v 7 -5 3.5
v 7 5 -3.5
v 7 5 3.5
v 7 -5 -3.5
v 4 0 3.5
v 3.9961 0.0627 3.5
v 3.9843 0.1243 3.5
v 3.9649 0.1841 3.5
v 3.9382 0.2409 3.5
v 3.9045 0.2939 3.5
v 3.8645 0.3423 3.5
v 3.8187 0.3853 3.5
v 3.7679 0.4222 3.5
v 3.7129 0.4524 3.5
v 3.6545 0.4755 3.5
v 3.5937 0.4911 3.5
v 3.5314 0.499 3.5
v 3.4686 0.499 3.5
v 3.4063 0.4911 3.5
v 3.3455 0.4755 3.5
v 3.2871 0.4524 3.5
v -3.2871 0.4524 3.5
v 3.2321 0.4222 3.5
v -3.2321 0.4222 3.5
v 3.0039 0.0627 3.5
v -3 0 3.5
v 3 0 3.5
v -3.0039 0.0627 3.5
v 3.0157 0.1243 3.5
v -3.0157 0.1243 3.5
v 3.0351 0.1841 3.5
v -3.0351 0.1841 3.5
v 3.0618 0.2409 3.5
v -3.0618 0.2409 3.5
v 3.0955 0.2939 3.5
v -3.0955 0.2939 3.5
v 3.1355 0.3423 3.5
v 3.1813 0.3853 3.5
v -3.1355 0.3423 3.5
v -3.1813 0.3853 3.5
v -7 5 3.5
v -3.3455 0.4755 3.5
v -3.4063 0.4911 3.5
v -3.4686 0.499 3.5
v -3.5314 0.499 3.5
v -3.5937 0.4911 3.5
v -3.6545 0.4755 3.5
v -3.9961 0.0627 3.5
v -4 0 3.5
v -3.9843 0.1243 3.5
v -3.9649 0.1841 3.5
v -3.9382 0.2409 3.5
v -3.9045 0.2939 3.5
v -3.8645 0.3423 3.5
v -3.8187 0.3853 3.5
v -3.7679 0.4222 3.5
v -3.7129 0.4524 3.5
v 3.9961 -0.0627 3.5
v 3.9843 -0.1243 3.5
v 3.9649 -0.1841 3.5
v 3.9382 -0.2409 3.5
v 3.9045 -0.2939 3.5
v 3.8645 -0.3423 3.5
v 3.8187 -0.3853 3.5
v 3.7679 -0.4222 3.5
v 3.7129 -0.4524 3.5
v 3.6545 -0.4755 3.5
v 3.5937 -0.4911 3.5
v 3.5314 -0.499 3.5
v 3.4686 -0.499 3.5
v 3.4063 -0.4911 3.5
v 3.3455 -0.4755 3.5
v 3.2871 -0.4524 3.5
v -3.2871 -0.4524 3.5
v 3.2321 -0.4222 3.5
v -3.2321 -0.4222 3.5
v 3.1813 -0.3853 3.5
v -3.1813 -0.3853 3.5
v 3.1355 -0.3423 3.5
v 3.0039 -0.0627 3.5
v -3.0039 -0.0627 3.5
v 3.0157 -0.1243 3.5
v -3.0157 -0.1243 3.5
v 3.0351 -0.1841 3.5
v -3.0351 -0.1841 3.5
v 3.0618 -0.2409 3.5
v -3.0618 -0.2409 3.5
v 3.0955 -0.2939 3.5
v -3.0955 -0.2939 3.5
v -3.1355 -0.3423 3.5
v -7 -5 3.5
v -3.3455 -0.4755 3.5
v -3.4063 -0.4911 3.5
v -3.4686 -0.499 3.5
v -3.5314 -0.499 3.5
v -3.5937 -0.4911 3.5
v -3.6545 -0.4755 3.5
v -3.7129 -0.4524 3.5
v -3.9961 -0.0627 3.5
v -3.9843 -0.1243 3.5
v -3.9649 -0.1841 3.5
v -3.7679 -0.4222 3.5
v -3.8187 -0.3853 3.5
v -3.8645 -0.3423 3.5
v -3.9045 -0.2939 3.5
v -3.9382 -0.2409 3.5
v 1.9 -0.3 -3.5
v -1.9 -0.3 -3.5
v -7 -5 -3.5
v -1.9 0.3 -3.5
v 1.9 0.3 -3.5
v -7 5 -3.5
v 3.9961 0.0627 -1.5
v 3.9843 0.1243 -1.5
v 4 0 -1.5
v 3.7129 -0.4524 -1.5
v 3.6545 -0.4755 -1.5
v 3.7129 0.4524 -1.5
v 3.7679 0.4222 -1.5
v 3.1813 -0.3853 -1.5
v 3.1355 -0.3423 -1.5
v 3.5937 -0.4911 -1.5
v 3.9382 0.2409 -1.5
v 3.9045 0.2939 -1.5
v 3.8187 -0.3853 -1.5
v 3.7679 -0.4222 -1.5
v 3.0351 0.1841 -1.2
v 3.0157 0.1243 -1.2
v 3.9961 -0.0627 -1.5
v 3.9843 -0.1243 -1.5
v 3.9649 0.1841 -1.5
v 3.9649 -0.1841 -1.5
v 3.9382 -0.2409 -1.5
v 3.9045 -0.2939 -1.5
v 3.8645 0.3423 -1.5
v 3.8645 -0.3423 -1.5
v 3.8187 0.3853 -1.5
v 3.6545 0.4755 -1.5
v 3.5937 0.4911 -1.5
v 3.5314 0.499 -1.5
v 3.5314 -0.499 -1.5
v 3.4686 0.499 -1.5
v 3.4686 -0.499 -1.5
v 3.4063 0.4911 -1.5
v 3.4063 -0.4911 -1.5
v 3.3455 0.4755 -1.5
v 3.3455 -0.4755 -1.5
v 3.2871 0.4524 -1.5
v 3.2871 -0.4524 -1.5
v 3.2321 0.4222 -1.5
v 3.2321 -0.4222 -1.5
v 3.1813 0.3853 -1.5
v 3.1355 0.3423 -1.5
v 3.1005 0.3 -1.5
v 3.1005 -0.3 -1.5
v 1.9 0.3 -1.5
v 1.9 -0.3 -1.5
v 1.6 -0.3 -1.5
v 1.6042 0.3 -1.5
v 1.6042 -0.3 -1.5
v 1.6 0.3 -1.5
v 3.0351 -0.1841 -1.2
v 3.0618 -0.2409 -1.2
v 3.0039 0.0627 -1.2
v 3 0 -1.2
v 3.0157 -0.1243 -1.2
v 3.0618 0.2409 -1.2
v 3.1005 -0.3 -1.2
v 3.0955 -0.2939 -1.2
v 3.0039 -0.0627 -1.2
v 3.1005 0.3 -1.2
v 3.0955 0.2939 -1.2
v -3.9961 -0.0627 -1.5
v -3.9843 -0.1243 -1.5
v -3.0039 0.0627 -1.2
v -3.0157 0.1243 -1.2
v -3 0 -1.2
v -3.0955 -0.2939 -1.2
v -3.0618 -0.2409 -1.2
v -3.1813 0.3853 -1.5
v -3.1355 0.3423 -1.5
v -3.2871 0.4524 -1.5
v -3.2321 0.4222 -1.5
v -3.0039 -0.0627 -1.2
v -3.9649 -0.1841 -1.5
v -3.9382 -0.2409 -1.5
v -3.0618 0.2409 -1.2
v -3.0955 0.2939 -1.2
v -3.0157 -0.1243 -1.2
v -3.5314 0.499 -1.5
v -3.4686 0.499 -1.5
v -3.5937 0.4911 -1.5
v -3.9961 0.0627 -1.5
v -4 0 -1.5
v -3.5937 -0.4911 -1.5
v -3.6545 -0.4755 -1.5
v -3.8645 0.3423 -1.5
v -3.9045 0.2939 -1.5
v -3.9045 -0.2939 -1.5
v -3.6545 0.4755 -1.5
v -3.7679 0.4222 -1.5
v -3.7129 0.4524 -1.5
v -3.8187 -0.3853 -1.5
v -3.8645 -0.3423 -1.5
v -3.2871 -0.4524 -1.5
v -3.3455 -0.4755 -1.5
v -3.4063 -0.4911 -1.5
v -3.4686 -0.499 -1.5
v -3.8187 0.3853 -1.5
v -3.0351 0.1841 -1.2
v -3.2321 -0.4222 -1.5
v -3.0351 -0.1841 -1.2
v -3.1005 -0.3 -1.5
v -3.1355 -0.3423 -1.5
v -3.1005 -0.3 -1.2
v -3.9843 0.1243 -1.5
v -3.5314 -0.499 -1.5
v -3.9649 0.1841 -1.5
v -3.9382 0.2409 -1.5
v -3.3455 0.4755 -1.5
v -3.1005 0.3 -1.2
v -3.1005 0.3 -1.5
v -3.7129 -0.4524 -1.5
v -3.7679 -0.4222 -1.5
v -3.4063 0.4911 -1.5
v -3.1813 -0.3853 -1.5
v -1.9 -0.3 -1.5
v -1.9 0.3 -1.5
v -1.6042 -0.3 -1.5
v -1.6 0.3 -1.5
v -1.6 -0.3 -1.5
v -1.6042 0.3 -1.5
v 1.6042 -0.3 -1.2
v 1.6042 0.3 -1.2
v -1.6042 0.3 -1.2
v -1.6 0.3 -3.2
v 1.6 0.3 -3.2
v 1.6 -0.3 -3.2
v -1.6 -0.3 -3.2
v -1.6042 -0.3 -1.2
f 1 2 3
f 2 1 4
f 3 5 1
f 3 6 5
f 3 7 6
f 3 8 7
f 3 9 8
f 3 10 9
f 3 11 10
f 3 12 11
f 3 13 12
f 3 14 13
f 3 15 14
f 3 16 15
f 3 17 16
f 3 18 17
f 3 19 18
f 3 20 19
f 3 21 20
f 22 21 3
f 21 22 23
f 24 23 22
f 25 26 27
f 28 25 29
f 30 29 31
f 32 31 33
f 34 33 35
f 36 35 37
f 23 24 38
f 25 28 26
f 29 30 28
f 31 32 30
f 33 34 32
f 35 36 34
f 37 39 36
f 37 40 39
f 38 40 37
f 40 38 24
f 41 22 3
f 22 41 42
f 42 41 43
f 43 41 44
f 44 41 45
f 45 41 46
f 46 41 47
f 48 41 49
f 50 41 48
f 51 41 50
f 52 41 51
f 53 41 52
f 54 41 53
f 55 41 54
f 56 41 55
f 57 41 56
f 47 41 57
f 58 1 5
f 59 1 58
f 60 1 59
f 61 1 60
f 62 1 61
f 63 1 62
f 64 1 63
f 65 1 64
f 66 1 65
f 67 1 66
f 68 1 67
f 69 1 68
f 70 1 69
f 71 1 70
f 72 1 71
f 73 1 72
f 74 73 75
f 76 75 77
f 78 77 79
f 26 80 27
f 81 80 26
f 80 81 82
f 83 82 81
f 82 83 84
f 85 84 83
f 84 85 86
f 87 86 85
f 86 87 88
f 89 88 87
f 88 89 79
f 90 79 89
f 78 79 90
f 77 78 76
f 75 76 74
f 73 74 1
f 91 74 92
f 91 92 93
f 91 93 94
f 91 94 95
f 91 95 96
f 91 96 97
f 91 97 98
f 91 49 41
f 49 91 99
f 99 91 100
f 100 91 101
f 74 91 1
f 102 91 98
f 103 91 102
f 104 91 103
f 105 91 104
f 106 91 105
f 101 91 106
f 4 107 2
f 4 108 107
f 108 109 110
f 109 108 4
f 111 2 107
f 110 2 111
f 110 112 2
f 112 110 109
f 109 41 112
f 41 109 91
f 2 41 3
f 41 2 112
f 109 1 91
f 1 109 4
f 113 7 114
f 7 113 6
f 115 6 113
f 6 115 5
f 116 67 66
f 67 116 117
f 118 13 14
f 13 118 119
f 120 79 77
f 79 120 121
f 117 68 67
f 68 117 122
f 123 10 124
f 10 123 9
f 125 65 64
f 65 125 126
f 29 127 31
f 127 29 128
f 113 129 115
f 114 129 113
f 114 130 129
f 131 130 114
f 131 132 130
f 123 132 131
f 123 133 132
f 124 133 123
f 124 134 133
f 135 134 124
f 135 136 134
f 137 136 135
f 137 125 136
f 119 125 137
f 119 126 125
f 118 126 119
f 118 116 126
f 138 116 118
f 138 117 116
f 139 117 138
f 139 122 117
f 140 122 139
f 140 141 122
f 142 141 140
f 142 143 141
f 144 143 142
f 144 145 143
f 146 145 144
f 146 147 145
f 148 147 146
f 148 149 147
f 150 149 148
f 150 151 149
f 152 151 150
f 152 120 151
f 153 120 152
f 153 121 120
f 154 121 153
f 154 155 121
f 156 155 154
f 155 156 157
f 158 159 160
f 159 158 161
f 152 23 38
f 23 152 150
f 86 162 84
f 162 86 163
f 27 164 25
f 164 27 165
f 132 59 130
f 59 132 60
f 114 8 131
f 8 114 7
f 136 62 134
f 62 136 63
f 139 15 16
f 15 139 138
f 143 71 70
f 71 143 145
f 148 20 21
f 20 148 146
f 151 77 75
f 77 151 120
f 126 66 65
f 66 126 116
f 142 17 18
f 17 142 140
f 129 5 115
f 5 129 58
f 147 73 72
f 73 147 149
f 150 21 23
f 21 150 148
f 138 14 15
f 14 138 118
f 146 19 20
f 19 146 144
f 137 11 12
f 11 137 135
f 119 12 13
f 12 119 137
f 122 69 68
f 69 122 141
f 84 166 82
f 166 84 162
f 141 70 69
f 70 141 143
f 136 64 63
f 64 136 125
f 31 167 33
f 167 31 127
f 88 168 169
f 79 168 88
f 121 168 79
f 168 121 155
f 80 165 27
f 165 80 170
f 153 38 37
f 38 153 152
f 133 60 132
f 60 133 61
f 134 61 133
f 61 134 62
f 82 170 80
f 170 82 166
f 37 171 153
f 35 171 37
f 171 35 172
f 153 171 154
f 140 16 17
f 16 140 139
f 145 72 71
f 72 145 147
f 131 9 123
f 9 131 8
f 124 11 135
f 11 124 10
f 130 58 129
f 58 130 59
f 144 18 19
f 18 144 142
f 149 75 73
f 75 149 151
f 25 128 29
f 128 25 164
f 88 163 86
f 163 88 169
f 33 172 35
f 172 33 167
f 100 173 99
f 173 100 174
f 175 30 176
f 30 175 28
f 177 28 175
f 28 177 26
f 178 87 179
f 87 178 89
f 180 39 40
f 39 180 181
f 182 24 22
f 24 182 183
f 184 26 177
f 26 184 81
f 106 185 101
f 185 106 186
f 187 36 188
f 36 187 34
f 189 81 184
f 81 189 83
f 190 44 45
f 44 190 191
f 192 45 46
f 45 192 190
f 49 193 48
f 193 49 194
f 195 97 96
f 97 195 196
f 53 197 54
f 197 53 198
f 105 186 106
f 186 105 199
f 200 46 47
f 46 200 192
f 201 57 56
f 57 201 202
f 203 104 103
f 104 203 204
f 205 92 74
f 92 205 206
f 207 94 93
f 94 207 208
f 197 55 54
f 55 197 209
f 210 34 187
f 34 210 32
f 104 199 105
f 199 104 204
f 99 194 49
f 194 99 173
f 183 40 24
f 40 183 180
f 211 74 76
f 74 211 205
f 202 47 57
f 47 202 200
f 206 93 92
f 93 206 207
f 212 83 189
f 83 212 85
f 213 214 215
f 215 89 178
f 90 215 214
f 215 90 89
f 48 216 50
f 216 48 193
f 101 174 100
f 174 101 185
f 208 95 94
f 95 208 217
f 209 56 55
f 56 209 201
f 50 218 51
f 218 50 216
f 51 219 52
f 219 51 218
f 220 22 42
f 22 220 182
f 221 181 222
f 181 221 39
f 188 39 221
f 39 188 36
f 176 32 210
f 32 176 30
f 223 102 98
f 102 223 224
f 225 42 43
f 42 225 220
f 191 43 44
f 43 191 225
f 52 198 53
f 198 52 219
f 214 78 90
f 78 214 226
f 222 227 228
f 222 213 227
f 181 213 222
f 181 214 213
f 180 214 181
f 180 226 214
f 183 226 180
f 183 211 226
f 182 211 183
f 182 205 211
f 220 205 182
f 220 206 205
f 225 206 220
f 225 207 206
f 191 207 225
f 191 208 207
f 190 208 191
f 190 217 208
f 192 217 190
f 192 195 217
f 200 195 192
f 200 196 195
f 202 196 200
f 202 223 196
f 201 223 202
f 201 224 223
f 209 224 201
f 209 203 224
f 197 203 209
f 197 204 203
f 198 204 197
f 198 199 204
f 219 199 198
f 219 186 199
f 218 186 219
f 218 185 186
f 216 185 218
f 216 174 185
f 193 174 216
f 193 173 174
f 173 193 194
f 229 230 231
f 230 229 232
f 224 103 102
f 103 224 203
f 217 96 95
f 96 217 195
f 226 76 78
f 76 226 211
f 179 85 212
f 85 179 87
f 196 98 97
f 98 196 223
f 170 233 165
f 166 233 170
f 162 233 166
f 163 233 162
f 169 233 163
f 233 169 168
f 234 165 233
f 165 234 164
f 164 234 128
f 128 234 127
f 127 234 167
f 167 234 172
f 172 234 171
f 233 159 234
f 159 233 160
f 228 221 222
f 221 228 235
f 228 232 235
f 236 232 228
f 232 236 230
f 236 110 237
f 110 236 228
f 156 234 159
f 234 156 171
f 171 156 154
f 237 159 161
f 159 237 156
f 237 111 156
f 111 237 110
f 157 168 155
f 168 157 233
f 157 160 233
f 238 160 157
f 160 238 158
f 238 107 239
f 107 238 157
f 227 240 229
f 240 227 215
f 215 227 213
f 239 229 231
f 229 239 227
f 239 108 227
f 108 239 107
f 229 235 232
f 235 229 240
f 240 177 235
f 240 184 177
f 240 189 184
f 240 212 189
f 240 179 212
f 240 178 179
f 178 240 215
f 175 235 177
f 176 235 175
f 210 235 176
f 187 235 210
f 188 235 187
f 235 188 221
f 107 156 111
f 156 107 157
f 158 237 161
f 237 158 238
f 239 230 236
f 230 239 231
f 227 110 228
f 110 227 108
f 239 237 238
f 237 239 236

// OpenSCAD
module mrMicro(){
	//block dimensions (use for shifting)
	x=14;
	y=10;
	z=7;
	depth=5; 
	difference(){
		cube([x,y,z], center =true);
		//translate([-x/2,0,0])cube([x,y,z], center =true);
		translate([.25*x,0,1])cylinder(r=.5,h=depth,$fn=50,center=true);
		translate([-.25*x,0,1])cylinder(r=.5,h=depth,$fn=50,center=true);
		translate([x/4-(x/16),0,-1.5+.15])cube([x/8+x/48,.6,.3],center=true);
		translate([(x/4-x/16),0,-1.5+.15])cube([x/8+x/48,.6,.3],center=true);
		translate([-(x/4-x/16),0,-1.5+.15])cube([x/8+x/48,.6,.3],center=true);
		translate([x*.125,0,-2.5])cube([.3,.6,z-depth],center=true);
		translate([-x*.125,0,-2.5])cube([.3,.6,z-depth],center=true);
		translate([0,0,-z/2+.15])cube([x*.25,.6,.3],center=true);
	}
	
	



} mrMicro();

//translate([])cube([])center=true;
